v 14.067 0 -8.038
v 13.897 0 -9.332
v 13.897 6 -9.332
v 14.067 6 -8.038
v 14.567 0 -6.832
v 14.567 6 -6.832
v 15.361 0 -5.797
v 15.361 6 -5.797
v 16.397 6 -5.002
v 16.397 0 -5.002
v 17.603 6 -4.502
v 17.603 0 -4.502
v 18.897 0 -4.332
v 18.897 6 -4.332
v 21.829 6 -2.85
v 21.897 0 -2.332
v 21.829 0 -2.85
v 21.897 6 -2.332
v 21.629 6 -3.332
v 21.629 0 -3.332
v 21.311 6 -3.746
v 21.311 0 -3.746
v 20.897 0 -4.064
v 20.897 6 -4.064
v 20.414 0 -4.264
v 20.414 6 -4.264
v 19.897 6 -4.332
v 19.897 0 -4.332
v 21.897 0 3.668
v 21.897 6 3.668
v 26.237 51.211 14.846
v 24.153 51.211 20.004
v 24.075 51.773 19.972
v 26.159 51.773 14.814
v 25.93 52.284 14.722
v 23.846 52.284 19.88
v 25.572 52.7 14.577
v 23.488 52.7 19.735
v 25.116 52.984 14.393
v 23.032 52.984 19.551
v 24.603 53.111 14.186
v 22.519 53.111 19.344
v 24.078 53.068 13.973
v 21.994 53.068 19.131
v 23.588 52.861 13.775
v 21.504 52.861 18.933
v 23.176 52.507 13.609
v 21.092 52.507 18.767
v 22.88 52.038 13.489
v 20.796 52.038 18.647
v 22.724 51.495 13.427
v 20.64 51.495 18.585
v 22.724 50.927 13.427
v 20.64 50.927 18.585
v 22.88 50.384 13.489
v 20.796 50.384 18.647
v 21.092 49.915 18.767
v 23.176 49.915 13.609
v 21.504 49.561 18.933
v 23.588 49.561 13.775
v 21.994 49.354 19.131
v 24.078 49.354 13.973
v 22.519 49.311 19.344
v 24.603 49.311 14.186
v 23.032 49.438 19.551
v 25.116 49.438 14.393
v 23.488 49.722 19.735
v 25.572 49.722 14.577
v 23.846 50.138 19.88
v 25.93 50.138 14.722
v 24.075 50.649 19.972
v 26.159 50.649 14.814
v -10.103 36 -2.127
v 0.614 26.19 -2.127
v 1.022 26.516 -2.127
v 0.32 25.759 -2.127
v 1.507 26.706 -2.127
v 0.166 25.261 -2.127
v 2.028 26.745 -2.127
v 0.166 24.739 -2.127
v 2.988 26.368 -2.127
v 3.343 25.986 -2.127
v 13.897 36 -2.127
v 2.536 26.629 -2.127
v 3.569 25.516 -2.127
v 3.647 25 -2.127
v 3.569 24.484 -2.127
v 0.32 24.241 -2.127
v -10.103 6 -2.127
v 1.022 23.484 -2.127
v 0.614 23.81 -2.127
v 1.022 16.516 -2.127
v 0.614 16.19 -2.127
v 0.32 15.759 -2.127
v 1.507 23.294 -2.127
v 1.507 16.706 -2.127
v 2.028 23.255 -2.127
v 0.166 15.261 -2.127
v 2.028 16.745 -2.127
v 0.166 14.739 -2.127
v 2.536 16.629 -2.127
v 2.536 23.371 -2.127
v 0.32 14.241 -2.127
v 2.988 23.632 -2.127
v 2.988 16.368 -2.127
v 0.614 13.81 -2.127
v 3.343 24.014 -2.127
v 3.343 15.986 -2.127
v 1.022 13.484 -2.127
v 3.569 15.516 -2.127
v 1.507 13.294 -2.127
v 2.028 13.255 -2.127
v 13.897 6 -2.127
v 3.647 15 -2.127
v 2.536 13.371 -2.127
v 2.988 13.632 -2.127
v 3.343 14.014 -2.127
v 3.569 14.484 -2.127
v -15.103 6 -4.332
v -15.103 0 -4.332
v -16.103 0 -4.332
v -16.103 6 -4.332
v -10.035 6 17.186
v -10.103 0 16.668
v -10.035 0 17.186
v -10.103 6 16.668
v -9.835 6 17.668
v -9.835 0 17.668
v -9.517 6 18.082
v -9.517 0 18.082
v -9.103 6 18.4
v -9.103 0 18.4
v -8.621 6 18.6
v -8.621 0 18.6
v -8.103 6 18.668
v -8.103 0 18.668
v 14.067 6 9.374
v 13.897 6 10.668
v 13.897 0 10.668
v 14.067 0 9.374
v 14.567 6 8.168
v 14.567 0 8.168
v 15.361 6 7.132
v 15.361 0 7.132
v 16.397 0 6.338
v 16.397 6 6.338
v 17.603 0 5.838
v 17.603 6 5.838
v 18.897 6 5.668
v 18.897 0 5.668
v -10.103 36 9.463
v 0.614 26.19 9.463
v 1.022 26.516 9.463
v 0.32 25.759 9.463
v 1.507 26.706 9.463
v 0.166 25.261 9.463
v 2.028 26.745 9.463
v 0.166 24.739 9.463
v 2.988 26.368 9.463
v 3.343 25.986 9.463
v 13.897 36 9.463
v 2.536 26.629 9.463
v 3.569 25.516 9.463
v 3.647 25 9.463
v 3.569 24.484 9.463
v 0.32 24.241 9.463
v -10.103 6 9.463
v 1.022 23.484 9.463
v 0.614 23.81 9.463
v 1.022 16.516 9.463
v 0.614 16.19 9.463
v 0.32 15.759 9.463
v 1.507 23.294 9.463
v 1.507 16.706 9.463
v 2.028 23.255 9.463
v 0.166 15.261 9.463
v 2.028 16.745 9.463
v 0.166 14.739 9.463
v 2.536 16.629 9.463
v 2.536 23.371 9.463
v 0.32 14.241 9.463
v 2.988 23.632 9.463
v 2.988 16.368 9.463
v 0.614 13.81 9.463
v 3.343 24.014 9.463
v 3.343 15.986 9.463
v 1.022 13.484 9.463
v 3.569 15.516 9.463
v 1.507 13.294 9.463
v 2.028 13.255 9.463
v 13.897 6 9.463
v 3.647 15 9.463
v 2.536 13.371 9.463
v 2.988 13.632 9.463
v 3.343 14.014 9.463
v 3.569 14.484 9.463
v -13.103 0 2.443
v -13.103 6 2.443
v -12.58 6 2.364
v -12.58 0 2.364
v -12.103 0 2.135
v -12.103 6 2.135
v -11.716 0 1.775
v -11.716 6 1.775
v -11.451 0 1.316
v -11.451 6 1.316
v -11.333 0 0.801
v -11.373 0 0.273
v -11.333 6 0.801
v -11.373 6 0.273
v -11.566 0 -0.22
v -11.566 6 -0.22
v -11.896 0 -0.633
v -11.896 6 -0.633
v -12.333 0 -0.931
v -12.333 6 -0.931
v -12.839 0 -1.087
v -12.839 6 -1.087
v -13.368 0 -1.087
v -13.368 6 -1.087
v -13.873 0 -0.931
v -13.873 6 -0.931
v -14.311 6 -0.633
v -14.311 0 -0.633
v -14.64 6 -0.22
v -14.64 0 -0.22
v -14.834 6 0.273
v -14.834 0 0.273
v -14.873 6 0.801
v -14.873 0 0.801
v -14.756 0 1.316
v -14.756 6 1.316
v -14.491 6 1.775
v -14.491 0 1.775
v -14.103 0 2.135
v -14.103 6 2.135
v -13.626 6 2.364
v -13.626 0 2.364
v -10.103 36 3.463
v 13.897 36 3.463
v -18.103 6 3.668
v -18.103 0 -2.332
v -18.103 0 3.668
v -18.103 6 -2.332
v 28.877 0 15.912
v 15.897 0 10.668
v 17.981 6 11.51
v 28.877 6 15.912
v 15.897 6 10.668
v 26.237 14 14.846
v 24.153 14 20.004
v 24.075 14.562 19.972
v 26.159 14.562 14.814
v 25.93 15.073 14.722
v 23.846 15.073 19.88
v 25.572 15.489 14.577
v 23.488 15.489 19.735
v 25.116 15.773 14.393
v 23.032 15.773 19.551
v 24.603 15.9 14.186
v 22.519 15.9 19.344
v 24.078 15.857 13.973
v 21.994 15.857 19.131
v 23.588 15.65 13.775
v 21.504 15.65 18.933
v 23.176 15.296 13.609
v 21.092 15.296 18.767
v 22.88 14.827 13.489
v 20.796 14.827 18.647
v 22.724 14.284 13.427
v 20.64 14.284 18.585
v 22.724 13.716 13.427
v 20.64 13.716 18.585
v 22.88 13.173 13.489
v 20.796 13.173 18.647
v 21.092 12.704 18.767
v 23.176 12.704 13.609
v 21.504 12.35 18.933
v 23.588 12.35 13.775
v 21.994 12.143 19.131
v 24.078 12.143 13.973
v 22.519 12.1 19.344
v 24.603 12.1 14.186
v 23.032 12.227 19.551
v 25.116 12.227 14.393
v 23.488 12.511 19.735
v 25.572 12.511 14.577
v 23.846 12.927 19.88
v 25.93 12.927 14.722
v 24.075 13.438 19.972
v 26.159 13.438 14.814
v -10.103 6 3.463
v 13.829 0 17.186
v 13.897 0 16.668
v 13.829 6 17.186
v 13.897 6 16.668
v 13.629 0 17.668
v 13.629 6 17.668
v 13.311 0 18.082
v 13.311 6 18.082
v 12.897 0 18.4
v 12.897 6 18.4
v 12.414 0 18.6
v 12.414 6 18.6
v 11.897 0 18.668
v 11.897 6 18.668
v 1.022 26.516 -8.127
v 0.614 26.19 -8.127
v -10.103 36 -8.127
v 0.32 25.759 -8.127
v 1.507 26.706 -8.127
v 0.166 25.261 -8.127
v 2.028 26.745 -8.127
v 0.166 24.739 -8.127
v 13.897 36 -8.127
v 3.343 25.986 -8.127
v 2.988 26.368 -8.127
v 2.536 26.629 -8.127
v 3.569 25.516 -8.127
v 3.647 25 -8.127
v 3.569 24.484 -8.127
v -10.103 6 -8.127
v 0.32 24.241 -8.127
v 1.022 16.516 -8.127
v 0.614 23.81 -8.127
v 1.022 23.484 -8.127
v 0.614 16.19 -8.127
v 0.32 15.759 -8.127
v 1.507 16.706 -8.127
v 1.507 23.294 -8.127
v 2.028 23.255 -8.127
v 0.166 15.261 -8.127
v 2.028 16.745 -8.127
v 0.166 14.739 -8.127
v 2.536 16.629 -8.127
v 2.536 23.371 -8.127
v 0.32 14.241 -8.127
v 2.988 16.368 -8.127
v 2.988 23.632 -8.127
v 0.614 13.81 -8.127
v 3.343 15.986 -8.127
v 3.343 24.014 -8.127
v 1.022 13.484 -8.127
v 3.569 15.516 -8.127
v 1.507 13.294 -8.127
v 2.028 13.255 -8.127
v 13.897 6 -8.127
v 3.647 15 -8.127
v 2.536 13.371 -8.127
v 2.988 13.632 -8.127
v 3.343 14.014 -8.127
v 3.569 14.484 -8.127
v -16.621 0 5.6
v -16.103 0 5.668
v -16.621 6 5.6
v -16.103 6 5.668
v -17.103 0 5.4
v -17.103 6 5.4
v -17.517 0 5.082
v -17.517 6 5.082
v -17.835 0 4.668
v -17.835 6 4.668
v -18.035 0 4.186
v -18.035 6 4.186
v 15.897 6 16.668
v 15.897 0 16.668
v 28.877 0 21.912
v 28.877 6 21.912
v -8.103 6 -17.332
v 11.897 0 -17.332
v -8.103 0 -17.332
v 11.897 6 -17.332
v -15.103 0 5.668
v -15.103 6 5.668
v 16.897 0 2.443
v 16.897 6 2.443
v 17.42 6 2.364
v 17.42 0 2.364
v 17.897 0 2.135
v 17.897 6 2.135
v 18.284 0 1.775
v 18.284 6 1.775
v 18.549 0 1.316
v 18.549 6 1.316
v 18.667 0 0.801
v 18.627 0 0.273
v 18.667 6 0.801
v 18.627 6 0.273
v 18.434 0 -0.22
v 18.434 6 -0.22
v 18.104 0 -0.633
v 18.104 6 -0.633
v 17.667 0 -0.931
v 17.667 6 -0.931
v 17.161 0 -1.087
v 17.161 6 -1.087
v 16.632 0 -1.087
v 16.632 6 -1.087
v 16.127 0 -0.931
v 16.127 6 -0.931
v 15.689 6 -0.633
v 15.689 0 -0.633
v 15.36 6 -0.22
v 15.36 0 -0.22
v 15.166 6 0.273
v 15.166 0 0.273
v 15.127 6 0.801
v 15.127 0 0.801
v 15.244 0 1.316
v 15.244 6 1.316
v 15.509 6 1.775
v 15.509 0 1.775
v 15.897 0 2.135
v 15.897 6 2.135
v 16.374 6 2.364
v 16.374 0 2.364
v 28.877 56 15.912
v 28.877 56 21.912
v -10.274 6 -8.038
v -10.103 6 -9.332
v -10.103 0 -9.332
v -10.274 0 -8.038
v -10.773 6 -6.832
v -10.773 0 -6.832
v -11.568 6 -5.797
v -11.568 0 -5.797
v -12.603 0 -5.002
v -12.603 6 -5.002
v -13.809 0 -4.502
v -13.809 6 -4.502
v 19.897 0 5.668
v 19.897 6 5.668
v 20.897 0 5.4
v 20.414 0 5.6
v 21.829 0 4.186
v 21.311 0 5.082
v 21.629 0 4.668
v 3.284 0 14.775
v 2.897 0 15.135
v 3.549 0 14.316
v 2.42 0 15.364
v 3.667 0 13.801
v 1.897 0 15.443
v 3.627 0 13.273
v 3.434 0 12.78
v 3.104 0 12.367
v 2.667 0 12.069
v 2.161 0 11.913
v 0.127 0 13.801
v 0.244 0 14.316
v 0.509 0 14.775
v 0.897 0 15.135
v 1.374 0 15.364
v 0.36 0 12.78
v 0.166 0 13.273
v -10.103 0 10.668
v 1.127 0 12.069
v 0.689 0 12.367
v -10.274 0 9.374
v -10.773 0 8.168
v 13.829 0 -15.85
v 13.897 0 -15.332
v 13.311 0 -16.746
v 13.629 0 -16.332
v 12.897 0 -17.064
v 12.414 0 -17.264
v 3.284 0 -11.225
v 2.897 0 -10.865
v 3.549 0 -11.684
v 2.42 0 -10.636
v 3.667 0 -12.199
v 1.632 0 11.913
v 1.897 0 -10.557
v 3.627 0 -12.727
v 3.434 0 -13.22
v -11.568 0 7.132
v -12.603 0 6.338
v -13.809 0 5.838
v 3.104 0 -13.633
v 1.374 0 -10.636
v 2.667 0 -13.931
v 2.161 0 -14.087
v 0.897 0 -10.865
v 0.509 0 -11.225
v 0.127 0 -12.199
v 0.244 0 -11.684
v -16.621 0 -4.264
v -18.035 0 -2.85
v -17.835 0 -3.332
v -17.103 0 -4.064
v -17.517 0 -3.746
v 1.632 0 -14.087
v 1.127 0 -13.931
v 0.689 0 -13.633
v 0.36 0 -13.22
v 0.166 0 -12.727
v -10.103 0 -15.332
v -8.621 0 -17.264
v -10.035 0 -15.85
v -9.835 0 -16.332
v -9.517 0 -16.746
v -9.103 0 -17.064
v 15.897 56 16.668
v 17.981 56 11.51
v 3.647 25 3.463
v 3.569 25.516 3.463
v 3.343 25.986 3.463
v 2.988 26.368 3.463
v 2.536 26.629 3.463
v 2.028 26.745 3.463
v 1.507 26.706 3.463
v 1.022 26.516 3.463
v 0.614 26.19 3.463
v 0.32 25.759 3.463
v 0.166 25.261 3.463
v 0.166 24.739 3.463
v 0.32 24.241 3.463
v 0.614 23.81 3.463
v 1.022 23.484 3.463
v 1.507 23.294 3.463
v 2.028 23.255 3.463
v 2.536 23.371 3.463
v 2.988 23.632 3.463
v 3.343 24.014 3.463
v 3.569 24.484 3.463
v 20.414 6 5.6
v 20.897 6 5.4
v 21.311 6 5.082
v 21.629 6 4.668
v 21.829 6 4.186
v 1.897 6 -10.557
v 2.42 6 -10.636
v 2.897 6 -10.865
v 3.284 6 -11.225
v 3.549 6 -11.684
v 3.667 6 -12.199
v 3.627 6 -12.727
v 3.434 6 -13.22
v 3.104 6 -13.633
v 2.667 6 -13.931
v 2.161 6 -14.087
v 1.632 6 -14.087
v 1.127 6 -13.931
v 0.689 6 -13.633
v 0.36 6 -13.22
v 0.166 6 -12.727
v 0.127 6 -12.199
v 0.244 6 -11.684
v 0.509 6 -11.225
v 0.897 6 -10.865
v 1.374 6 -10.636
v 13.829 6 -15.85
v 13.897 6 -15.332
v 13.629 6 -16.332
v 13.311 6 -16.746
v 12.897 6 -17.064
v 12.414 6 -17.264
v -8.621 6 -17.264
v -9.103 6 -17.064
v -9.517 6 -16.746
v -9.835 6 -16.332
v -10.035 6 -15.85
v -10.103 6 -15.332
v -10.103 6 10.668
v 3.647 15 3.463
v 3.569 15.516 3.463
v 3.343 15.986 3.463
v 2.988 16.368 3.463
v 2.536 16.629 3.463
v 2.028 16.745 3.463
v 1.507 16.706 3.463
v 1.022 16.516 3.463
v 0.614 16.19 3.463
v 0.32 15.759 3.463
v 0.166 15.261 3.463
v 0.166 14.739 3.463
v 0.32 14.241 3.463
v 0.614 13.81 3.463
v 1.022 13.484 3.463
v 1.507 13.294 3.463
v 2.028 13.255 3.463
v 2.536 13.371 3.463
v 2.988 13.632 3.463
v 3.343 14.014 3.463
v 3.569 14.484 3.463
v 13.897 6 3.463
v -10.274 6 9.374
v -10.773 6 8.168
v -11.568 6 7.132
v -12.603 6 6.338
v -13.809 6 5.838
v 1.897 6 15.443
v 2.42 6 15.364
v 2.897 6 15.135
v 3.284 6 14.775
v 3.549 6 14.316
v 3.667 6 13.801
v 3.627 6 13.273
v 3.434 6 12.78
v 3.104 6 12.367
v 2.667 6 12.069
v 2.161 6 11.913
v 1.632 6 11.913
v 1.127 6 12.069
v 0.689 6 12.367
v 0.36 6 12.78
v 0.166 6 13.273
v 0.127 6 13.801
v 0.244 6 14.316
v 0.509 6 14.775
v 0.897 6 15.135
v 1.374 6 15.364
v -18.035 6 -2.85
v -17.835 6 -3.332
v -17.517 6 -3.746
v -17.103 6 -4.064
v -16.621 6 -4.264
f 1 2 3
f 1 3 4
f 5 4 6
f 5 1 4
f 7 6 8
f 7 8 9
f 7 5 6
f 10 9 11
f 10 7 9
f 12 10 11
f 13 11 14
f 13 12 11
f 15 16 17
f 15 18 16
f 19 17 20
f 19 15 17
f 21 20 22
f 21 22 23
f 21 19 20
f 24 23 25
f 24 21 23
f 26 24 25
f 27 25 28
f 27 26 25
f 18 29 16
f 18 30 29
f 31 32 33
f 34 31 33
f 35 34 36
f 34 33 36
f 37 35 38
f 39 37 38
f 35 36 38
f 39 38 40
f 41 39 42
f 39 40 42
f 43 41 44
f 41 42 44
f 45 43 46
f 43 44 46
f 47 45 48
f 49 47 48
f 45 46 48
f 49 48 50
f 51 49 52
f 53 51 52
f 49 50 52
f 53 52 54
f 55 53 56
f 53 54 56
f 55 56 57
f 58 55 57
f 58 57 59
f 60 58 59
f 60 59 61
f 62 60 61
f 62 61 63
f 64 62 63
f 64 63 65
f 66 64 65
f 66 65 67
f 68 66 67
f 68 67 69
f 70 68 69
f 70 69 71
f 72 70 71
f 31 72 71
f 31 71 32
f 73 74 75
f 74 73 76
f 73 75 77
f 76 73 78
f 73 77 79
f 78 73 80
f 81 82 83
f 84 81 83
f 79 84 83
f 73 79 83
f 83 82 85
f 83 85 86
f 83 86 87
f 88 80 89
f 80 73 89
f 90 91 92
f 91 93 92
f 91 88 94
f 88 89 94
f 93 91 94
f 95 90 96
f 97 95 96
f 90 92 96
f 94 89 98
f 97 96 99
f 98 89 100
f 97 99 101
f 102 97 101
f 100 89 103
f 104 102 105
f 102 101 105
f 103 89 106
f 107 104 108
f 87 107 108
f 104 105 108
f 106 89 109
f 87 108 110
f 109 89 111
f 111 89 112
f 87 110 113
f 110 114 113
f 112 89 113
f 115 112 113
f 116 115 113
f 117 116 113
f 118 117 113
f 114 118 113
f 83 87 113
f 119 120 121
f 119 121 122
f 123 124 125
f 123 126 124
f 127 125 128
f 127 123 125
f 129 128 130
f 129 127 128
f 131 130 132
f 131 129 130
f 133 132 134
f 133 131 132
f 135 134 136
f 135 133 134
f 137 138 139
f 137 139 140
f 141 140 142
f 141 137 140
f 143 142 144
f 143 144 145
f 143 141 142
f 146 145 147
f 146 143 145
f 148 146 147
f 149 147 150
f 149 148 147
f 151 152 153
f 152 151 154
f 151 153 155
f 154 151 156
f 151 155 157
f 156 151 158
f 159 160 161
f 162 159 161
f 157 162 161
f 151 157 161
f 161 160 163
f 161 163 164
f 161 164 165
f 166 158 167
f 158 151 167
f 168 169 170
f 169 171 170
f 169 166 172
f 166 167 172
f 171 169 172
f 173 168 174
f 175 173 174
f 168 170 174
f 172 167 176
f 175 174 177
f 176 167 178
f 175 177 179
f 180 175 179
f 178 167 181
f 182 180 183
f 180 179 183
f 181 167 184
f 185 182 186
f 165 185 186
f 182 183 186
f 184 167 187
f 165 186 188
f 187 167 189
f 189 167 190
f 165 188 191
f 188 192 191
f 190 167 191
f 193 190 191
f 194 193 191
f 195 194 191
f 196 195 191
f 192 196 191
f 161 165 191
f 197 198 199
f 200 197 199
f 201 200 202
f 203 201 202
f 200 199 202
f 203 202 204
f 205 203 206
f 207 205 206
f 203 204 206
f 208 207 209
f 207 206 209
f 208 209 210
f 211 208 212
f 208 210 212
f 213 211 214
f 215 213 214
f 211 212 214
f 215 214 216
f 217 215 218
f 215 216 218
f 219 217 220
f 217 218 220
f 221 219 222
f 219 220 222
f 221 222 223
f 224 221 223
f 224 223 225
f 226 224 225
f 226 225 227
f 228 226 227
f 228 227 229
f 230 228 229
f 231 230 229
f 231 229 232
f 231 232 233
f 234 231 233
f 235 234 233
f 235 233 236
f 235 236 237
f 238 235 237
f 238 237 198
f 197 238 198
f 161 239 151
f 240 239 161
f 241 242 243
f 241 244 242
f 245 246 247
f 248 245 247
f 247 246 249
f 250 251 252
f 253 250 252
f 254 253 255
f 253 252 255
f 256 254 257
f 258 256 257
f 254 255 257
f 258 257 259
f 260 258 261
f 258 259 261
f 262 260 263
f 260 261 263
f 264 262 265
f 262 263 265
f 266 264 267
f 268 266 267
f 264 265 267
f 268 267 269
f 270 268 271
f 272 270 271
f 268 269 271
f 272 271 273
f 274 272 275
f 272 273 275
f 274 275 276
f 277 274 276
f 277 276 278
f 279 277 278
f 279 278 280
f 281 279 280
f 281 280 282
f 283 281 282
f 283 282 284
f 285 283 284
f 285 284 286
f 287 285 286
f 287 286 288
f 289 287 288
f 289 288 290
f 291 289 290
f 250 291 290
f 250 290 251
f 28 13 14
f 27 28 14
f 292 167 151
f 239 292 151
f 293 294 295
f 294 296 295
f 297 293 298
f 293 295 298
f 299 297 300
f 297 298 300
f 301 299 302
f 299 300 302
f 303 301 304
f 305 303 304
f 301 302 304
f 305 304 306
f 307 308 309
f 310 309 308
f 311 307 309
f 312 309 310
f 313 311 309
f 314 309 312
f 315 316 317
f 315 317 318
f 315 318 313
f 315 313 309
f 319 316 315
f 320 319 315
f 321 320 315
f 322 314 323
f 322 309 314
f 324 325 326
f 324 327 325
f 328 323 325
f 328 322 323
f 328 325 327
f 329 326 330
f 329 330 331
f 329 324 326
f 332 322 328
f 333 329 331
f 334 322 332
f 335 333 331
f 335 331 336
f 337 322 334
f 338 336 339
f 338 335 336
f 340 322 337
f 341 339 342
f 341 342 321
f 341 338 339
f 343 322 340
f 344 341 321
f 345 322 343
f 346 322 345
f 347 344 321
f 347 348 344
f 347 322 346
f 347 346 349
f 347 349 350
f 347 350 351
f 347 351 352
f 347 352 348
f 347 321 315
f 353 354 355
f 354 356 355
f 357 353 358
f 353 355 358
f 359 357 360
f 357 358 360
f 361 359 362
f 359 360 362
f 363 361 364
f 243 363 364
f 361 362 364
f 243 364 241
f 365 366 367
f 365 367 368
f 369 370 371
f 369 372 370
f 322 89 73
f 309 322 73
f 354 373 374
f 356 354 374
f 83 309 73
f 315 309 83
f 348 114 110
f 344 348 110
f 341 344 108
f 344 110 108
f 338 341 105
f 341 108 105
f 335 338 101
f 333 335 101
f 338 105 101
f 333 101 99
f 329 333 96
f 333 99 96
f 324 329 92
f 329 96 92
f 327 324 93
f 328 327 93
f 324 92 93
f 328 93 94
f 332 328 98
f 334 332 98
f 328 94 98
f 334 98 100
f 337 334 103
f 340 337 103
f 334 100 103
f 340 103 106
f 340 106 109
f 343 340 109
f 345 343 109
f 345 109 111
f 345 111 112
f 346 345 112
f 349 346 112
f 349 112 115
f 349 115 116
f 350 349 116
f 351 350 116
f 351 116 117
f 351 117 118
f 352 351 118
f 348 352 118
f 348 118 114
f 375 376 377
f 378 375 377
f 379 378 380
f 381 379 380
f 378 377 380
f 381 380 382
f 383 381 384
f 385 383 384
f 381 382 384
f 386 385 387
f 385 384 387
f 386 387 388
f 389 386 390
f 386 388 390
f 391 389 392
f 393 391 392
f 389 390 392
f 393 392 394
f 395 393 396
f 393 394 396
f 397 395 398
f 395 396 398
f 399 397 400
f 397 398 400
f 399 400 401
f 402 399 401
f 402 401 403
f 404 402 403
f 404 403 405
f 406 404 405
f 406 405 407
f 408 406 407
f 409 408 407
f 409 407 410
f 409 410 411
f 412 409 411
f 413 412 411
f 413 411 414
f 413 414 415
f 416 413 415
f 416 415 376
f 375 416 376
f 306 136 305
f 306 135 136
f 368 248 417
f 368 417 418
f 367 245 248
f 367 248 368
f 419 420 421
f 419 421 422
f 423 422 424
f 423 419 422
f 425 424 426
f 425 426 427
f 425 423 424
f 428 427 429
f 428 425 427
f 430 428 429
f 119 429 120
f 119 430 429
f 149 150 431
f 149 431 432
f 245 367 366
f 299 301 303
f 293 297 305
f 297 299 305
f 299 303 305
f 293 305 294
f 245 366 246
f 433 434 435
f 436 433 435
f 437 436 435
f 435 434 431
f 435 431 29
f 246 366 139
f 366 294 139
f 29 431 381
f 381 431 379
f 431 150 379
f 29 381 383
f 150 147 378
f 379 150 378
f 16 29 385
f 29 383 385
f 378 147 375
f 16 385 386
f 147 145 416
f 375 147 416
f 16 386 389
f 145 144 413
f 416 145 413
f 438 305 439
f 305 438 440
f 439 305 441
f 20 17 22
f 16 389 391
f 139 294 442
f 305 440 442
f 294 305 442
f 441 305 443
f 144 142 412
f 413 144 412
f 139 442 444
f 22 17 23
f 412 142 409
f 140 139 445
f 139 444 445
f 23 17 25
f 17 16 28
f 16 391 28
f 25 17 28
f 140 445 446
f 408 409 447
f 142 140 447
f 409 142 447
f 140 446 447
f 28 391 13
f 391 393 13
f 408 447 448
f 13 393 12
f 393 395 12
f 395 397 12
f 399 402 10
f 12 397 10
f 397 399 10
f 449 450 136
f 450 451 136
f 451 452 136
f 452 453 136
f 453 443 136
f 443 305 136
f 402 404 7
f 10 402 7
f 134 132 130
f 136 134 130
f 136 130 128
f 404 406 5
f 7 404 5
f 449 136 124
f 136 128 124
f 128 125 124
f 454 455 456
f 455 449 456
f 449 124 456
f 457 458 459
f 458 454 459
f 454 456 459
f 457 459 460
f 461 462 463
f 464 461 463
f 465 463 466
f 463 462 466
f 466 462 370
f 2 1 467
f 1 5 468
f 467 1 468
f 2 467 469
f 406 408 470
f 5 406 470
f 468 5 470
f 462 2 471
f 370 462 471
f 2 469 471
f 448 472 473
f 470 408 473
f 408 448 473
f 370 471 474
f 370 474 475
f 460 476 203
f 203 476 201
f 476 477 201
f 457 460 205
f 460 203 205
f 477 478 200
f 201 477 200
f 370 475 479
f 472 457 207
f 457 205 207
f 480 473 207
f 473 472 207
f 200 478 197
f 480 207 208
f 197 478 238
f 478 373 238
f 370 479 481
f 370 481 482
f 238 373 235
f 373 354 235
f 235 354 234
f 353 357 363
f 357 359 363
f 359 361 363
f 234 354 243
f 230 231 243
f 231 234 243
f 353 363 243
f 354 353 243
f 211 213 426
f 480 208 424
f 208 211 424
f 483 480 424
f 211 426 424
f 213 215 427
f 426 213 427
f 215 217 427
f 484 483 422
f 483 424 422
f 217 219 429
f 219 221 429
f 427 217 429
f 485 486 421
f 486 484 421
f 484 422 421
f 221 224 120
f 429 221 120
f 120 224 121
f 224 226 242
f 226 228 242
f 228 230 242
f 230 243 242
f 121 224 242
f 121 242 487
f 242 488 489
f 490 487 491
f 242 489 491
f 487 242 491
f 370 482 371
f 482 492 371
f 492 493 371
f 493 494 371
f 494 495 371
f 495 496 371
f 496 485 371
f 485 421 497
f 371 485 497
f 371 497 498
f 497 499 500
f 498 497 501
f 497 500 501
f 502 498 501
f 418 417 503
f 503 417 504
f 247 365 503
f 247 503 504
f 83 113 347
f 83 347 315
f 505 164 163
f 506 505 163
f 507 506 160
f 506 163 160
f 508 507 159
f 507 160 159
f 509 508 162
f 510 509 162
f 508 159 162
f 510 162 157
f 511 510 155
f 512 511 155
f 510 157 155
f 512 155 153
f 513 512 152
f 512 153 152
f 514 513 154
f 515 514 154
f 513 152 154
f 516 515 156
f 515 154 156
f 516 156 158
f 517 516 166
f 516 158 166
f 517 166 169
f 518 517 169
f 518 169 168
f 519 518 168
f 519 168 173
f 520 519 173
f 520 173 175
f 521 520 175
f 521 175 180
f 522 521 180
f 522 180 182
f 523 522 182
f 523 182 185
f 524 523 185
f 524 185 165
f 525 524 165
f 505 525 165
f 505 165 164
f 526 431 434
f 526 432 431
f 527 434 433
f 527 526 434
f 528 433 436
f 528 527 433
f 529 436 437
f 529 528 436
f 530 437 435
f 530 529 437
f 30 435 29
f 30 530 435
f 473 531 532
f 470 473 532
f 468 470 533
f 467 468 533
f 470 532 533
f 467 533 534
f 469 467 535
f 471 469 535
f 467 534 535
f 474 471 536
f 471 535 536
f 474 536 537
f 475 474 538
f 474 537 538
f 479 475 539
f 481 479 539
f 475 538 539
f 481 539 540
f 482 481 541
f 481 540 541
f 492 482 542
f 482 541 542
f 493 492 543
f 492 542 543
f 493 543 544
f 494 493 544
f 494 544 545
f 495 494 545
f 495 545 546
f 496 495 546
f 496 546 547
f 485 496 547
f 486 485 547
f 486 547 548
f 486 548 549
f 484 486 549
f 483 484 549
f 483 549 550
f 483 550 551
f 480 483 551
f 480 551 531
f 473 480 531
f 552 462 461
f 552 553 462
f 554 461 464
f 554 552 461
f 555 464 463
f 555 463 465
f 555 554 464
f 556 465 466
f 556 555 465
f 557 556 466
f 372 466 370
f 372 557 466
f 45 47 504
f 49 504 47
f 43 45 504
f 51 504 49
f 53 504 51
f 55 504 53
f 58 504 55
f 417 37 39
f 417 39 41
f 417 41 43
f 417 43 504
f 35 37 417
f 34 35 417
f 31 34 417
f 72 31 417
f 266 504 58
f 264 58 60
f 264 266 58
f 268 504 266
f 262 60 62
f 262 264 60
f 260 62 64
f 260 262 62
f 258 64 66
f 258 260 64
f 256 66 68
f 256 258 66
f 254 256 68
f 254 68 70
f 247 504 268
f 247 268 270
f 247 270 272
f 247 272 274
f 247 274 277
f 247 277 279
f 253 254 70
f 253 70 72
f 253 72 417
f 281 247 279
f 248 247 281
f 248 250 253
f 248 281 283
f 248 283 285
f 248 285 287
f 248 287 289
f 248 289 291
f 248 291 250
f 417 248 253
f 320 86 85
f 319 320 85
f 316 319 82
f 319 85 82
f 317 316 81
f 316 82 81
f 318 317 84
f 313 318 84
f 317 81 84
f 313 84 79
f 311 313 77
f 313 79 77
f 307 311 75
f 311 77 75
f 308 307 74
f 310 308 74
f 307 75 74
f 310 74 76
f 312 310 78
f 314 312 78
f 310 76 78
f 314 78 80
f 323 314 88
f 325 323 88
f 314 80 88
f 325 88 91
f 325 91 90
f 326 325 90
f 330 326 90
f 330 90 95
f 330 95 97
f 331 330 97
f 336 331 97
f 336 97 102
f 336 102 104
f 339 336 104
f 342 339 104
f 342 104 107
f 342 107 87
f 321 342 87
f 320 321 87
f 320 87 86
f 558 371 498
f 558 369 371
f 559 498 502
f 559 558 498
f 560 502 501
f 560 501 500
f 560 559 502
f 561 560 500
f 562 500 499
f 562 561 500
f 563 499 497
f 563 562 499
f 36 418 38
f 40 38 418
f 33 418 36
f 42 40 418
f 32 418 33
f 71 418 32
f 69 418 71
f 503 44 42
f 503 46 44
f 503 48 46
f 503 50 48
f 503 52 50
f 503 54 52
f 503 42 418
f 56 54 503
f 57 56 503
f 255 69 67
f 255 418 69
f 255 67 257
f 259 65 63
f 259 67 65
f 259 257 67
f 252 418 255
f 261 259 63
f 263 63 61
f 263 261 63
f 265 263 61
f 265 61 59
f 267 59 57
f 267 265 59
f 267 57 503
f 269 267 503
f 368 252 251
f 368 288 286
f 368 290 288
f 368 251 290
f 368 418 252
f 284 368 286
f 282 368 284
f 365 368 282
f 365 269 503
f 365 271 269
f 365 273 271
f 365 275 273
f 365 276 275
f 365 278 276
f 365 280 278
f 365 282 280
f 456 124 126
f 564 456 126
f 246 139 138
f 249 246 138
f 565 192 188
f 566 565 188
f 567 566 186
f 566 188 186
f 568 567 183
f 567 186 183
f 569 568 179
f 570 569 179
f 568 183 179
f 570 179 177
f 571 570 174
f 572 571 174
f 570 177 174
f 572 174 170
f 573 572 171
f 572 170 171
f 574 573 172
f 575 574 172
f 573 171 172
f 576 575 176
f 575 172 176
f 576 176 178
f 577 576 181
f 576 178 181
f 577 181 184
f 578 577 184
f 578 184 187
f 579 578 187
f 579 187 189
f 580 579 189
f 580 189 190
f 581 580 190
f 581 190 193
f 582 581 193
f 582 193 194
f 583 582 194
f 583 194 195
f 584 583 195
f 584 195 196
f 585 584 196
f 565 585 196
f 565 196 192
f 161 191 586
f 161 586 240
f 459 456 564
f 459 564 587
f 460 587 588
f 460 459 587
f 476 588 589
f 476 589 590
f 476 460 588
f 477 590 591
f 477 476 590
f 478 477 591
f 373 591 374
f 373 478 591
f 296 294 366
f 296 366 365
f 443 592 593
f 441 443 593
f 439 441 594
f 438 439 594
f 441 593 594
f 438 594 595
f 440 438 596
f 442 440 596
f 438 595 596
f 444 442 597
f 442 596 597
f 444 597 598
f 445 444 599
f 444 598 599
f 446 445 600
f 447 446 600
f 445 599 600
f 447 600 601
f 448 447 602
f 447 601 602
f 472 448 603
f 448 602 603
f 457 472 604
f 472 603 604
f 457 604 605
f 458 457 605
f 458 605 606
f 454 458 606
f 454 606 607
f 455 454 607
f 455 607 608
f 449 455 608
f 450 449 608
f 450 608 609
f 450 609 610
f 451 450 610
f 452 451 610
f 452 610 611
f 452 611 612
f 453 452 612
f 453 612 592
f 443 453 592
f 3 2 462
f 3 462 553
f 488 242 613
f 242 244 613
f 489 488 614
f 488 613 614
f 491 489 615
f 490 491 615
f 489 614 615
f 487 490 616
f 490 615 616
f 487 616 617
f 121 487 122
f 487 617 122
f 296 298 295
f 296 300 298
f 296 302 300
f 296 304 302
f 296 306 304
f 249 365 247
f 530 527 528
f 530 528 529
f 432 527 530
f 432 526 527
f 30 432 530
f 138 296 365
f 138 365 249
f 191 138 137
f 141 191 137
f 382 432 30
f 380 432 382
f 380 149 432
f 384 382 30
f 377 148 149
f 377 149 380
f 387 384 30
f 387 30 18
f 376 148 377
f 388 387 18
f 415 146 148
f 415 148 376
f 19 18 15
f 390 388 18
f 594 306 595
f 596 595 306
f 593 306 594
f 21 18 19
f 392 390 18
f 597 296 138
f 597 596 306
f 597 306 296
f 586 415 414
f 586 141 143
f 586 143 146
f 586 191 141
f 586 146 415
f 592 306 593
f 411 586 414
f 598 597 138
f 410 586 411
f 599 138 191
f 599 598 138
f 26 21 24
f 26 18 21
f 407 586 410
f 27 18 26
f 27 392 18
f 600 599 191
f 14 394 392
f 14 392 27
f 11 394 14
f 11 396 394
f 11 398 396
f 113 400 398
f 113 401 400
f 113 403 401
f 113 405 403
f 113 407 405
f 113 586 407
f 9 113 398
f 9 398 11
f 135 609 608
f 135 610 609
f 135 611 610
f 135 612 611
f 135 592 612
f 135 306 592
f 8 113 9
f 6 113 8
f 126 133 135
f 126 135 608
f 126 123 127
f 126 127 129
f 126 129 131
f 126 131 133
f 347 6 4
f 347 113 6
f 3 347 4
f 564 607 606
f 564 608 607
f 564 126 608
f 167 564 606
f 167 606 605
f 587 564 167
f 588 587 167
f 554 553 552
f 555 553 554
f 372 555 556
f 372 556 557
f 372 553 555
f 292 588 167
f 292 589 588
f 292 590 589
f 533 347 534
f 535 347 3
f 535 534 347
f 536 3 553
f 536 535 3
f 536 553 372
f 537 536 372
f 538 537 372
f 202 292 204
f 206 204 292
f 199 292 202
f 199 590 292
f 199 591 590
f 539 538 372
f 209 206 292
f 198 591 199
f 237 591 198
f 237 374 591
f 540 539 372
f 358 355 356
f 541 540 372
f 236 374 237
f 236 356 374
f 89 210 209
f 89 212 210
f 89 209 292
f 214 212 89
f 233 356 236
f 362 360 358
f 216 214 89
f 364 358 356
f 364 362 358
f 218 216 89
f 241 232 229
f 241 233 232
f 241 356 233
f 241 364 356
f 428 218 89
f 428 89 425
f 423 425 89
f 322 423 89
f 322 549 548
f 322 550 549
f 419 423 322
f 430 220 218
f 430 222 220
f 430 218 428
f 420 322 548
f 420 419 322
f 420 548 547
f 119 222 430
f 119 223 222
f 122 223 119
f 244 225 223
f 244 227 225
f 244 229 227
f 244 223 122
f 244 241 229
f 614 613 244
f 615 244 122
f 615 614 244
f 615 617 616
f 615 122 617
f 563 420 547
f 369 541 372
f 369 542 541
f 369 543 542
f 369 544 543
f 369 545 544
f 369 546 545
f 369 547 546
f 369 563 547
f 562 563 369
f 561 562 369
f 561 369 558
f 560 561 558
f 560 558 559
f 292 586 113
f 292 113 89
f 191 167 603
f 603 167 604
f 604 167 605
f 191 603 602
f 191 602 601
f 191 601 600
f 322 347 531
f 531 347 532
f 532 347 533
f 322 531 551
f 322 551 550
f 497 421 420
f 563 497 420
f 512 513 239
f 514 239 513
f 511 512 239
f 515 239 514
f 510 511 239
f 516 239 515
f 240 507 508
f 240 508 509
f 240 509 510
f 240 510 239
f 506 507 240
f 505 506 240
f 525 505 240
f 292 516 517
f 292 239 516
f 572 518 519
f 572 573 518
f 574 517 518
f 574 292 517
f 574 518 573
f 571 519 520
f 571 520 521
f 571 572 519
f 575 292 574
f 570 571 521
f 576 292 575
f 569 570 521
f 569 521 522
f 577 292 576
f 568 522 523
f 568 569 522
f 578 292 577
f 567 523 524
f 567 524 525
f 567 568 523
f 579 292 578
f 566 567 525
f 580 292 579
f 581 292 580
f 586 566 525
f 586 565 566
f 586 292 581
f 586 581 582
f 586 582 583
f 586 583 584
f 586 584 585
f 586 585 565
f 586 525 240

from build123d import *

# Parameters (mm, degrees)
SKETCH1_W           = 24
SKETCH1_H           = 24
BOSS_EXTRUDE1_DEPTH = 6
SKETCH2_W           = 24
SKETCH2_H           = 6
BOSS_EXTRUDE2_DEPTH = 30
SKETCH3_W           = 24
SKETCH3_H           = 6
BOSS_EXTRUDE3_DEPTH = 6
SKETCH4_W           = 24
SKETCH4_H           = 6
BOSS_EXTRUDE4_DEPTH = 6
SKETCH5_W           = 10
SKETCH5_H           = 6
BOSS_EXTRUDE5_DEPTH = 8
FILLET1_R           = 5
FILLET2_R           = 2
FILLET3_R           = 2
SKETCH6_W           = 10
SKETCH6_H           = 6
BOSS_EXTRUDE6_DEPTH = 8
FILLET4_R           = 5
FILLET5_R           = 2
SKETCH7_R           = 1.775
CUT_EXTRUDE1_DEPTH  = 42.568724431
SKETCH8_W           = 6
SKETCH8_H           = 6
BOSS_EXTRUDE7_DEPTH = 2
SKETCH10_W          = 6
SKETCH10_H          = 6
BOSS_EXTRUDE8_DEPTH = 14
BOSS_EXTRUDE9_DEPTH = 50
SKETCH12_R          = 1.905
CUT_EXTRUDE2_DEPTH  = 70.795111418
CUT_EXTRUDE3_REACH  = 70.468
SKETCH13_R          = 1.75


with BuildPart() as part:
    # Sketch1 → Boss-Extrude1 (new body)
    with BuildSketch(Plane(origin=(0, 0, 0), x_dir=(1, 0, 0), z_dir=(0, 1, 0))):
        with Locations((1.896724894, -0.667948192)):
            Rectangle(SKETCH1_W, SKETCH1_H)
    extrude(amount=BOSS_EXTRUDE1_DEPTH)

    # Sketch2 → Boss-Extrude2 (add)
    with BuildSketch(Plane(origin=(0, 6, 0), x_dir=(1, 0, 0), z_dir=(0, 1, 0))):
        with Locations((1.896724894, -6.462948192)):
            Rectangle(SKETCH2_W, SKETCH2_H)
        with Locations((1.896724894, 5.127051808)):
            Rectangle(SKETCH2_W, SKETCH2_H)
    extrude(amount=BOSS_EXTRUDE2_DEPTH)

    # Sketch3 → Boss-Extrude3 (add)
    with BuildSketch(Plane.XY.offset(12.667948192)):
        with Locations((1.896724894, 3)):
            Rectangle(SKETCH3_W, SKETCH3_H)
    extrude(amount=BOSS_EXTRUDE3_DEPTH)

    # Sketch4 → Boss-Extrude4 (add)
    with BuildSketch(Plane(origin=(0, 0, -11.332051808), x_dir=(-1, 0, 0), z_dir=(0, 0, -1))):
        with Locations((-1.896724894, 3)):
            Rectangle(SKETCH4_W, SKETCH4_H)
    extrude(amount=BOSS_EXTRUDE4_DEPTH)

    # Sketch5 → Boss-Extrude5 (add)
    with BuildSketch(Plane(origin=(13.896724894, 0, 0), x_dir=(0, 0, -1), z_dir=(1, 0, 0))):
        with Locations((-0.667948192, 3)):
            Rectangle(SKETCH5_W, SKETCH5_H)
    extrude(amount=BOSS_EXTRUDE5_DEPTH)

    # Fillet1
    # the kernel refuses this fillet: 5 mm, written as the material it adds along each edge
    with BuildSketch(Plane(origin=(13.896724894, 0, -4.332051808), x_dir=(0, 0, -1), z_dir=(0, 1, 0)), Plane(origin=(13.896724894, 6, 5.667948192), x_dir=(0, 0, 1), z_dir=(0, -1, 0))) as fillet1_piece_1:
        with BuildLine():
            CenterArc((FILLET1_R, -FILLET1_R), FILLET1_R, 90, 90)
            Line((0, -FILLET1_R), (0, 0))
            Line((0, 0), (FILLET1_R, 0))
        make_face()
    extrude(amount=6)

    # Fillet2
    fillet2_edges = [part.edges().sort_by_distance(p)[0] for p in [
        (21.896724894, 3, -4.332051808),
        (21.896724894, 3, 5.667948192),
    ]]
    fillet(fillet2_edges, radius=FILLET2_R)

    # Fillet3
    fillet3_edges = [part.edges().sort_by_distance(p)[0] for p in [
        (-10.103275106, 3, 18.667948192),
        (13.896724894, 3, 18.667948192),
        (13.896724894, 3, -17.332051808),
        (-10.103275106, 3, -17.332051808),
    ]]
    fillet(fillet3_edges, radius=FILLET3_R)

    # Sketch6 → Boss-Extrude6 (add)
    with BuildSketch(Plane.ZY.offset(10.103275106)):
        with Locations((0.667948192, 3)):
            Rectangle(SKETCH6_W, SKETCH6_H)
    extrude(amount=BOSS_EXTRUDE6_DEPTH)

    # Fillet4
    # the kernel refuses this fillet: 5 mm, written as the material it adds along each edge
    with BuildSketch(Plane(origin=(-10.103275106, 6, -4.332051808), x_dir=(0, 0, -1), z_dir=(0, -1, 0)), Plane(origin=(-10.103275106, 0, 5.667948192), x_dir=(0, 0, 1), z_dir=(0, 1, 0))) as fillet4_piece_1:
        with BuildLine():
            CenterArc((FILLET4_R, -FILLET4_R), FILLET4_R, 90, 90)
            Line((0, -FILLET4_R), (0, 0))
            Line((0, 0), (FILLET4_R, 0))
        make_face()
    extrude(amount=6)

    # Fillet5
    fillet5_edges = [part.edges().sort_by_distance(p)[0] for p in [
        (-18.103275106, 3, -4.332051808),
        (-18.103275106, 3, 5.667948192),
    ]]
    fillet(fillet5_edges, radius=FILLET5_R)

    # Sketch7 → Cut-Extrude1 (cut, through all)
    with BuildSketch(Plane(origin=(0, 6, 0), x_dir=(1, 0, 0), z_dir=(0, 1, 0))):
        with Locations(Location((1.896724894, -13.667948192, 0), (0, 0, 270))):
            Circle(SKETCH7_R)
        with Locations(Location((-13.103275106, -0.667948192, 0), (0, 0, 270))):
            Circle(SKETCH7_R)
        with Locations(Location((1.896724894, 12.332051808, 0), (0, 0, 270))):
            Circle(SKETCH7_R)
        with Locations(Location((16.896724894, -0.667948192, 0), (0, 0, 270))):
            Circle(SKETCH7_R)
    extrude(amount=-CUT_EXTRUDE1_DEPTH, mode=Mode.SUBTRACT)

    # Sketch8 → Boss-Extrude7 (add)
    with BuildSketch(Plane(origin=(13.896724894, 0, 0), x_dir=(0, 0, -1), z_dir=(1, 0, 0))):
        with Locations((-13.667948192, 3)):
            Rectangle(SKETCH8_W, SKETCH8_H)
    extrude(amount=BOSS_EXTRUDE7_DEPTH)

    # Sketch10 → Boss-Extrude8 (add, along a direction that is not the sketch's normal)
    with BuildSketch(Plane(origin=(15.896724894, 0, 0), x_dir=(0, 0, -1), z_dir=(1, 0, 0))):
        with Locations((-13.667948192, 3)):
            Rectangle(SKETCH10_W, SKETCH10_H)
    extrude(amount=BOSS_EXTRUDE8_DEPTH, dir=(0.9271838545667885, 0, 0.3746065934159094))

    # Sketch11 → Boss-Extrude9 (add)
    with BuildSketch(Plane(origin=(0, 6, 0), x_dir=(1, 0, 0), z_dir=(0, 1, 0))):
        Polygon((28.877298858, -21.9124405), (15.896724894, -16.667948192), (17.980700006, -11.509928791), (28.877298858, -15.9124405), align=None)
    extrude(amount=BOSS_EXTRUDE9_DEPTH)

    # Sketch12 → Cut-Extrude2 (cut, through all)
    with BuildSketch(Plane(origin=(-3.558475874, 0, 8.807536853), x_dir=(0.9271838545667885, 0, 0.3746065934159093), z_dir=(-0.37460659341590935, 0, 0.9271838545667886))):
        with Locations((27.983109954, 14)):
            Circle(SKETCH12_R)
        with Locations((27.983109954, 51.211)):
            Circle(SKETCH12_R)
    extrude(amount=-CUT_EXTRUDE2_DEPTH, mode=Mode.SUBTRACT)

    # Cut-Extrude3: up to this face of the body (flat: up to its plane)
    cut_extrude3_end = Plane(part.part.faces().sort_by_distance((1.896724894, 21, -8.127051808))[0])
    # Sketch13 → Cut-Extrude3 (cut, up to the picked face)
    with BuildSketch(Plane.XY.offset(9.462948192), mode=Mode.PRIVATE) as cut_extrude3_sk1:
        with Locations((1.896724894, 15)):
            Circle(SKETCH13_R)
    cut_extrude3_tool1 = split(extrude(cut_extrude3_sk1.sketch, amount=-CUT_EXTRUDE3_REACH, mode=Mode.PRIVATE), bisect_by=cut_extrude3_end, keep=Keep.BOTH, mode=Mode.PRIVATE)
    # Sketch13 → Cut-Extrude3 (cut, up to the picked face)
    with BuildSketch(Plane.XY.offset(9.462948192), mode=Mode.PRIVATE) as cut_extrude3_sk2:
        with Locations((1.896724894, 25)):
            Circle(SKETCH13_R)
    cut_extrude3_tool2 = split(extrude(cut_extrude3_sk2.sketch, amount=-CUT_EXTRUDE3_REACH, mode=Mode.PRIVATE), bisect_by=cut_extrude3_end, keep=Keep.BOTH, mode=Mode.PRIVATE)
    add(cut_extrude3_tool1.solids().sort_by(Axis((1.896725, 15, 9.462948), (0, 0, -1)))[0], mode=Mode.SUBTRACT)
    add(cut_extrude3_tool2.solids().sort_by(Axis((1.896725, 25, 9.462948), (0, 0, -1)))[0], mode=Mode.SUBTRACT)


solid = part.part
